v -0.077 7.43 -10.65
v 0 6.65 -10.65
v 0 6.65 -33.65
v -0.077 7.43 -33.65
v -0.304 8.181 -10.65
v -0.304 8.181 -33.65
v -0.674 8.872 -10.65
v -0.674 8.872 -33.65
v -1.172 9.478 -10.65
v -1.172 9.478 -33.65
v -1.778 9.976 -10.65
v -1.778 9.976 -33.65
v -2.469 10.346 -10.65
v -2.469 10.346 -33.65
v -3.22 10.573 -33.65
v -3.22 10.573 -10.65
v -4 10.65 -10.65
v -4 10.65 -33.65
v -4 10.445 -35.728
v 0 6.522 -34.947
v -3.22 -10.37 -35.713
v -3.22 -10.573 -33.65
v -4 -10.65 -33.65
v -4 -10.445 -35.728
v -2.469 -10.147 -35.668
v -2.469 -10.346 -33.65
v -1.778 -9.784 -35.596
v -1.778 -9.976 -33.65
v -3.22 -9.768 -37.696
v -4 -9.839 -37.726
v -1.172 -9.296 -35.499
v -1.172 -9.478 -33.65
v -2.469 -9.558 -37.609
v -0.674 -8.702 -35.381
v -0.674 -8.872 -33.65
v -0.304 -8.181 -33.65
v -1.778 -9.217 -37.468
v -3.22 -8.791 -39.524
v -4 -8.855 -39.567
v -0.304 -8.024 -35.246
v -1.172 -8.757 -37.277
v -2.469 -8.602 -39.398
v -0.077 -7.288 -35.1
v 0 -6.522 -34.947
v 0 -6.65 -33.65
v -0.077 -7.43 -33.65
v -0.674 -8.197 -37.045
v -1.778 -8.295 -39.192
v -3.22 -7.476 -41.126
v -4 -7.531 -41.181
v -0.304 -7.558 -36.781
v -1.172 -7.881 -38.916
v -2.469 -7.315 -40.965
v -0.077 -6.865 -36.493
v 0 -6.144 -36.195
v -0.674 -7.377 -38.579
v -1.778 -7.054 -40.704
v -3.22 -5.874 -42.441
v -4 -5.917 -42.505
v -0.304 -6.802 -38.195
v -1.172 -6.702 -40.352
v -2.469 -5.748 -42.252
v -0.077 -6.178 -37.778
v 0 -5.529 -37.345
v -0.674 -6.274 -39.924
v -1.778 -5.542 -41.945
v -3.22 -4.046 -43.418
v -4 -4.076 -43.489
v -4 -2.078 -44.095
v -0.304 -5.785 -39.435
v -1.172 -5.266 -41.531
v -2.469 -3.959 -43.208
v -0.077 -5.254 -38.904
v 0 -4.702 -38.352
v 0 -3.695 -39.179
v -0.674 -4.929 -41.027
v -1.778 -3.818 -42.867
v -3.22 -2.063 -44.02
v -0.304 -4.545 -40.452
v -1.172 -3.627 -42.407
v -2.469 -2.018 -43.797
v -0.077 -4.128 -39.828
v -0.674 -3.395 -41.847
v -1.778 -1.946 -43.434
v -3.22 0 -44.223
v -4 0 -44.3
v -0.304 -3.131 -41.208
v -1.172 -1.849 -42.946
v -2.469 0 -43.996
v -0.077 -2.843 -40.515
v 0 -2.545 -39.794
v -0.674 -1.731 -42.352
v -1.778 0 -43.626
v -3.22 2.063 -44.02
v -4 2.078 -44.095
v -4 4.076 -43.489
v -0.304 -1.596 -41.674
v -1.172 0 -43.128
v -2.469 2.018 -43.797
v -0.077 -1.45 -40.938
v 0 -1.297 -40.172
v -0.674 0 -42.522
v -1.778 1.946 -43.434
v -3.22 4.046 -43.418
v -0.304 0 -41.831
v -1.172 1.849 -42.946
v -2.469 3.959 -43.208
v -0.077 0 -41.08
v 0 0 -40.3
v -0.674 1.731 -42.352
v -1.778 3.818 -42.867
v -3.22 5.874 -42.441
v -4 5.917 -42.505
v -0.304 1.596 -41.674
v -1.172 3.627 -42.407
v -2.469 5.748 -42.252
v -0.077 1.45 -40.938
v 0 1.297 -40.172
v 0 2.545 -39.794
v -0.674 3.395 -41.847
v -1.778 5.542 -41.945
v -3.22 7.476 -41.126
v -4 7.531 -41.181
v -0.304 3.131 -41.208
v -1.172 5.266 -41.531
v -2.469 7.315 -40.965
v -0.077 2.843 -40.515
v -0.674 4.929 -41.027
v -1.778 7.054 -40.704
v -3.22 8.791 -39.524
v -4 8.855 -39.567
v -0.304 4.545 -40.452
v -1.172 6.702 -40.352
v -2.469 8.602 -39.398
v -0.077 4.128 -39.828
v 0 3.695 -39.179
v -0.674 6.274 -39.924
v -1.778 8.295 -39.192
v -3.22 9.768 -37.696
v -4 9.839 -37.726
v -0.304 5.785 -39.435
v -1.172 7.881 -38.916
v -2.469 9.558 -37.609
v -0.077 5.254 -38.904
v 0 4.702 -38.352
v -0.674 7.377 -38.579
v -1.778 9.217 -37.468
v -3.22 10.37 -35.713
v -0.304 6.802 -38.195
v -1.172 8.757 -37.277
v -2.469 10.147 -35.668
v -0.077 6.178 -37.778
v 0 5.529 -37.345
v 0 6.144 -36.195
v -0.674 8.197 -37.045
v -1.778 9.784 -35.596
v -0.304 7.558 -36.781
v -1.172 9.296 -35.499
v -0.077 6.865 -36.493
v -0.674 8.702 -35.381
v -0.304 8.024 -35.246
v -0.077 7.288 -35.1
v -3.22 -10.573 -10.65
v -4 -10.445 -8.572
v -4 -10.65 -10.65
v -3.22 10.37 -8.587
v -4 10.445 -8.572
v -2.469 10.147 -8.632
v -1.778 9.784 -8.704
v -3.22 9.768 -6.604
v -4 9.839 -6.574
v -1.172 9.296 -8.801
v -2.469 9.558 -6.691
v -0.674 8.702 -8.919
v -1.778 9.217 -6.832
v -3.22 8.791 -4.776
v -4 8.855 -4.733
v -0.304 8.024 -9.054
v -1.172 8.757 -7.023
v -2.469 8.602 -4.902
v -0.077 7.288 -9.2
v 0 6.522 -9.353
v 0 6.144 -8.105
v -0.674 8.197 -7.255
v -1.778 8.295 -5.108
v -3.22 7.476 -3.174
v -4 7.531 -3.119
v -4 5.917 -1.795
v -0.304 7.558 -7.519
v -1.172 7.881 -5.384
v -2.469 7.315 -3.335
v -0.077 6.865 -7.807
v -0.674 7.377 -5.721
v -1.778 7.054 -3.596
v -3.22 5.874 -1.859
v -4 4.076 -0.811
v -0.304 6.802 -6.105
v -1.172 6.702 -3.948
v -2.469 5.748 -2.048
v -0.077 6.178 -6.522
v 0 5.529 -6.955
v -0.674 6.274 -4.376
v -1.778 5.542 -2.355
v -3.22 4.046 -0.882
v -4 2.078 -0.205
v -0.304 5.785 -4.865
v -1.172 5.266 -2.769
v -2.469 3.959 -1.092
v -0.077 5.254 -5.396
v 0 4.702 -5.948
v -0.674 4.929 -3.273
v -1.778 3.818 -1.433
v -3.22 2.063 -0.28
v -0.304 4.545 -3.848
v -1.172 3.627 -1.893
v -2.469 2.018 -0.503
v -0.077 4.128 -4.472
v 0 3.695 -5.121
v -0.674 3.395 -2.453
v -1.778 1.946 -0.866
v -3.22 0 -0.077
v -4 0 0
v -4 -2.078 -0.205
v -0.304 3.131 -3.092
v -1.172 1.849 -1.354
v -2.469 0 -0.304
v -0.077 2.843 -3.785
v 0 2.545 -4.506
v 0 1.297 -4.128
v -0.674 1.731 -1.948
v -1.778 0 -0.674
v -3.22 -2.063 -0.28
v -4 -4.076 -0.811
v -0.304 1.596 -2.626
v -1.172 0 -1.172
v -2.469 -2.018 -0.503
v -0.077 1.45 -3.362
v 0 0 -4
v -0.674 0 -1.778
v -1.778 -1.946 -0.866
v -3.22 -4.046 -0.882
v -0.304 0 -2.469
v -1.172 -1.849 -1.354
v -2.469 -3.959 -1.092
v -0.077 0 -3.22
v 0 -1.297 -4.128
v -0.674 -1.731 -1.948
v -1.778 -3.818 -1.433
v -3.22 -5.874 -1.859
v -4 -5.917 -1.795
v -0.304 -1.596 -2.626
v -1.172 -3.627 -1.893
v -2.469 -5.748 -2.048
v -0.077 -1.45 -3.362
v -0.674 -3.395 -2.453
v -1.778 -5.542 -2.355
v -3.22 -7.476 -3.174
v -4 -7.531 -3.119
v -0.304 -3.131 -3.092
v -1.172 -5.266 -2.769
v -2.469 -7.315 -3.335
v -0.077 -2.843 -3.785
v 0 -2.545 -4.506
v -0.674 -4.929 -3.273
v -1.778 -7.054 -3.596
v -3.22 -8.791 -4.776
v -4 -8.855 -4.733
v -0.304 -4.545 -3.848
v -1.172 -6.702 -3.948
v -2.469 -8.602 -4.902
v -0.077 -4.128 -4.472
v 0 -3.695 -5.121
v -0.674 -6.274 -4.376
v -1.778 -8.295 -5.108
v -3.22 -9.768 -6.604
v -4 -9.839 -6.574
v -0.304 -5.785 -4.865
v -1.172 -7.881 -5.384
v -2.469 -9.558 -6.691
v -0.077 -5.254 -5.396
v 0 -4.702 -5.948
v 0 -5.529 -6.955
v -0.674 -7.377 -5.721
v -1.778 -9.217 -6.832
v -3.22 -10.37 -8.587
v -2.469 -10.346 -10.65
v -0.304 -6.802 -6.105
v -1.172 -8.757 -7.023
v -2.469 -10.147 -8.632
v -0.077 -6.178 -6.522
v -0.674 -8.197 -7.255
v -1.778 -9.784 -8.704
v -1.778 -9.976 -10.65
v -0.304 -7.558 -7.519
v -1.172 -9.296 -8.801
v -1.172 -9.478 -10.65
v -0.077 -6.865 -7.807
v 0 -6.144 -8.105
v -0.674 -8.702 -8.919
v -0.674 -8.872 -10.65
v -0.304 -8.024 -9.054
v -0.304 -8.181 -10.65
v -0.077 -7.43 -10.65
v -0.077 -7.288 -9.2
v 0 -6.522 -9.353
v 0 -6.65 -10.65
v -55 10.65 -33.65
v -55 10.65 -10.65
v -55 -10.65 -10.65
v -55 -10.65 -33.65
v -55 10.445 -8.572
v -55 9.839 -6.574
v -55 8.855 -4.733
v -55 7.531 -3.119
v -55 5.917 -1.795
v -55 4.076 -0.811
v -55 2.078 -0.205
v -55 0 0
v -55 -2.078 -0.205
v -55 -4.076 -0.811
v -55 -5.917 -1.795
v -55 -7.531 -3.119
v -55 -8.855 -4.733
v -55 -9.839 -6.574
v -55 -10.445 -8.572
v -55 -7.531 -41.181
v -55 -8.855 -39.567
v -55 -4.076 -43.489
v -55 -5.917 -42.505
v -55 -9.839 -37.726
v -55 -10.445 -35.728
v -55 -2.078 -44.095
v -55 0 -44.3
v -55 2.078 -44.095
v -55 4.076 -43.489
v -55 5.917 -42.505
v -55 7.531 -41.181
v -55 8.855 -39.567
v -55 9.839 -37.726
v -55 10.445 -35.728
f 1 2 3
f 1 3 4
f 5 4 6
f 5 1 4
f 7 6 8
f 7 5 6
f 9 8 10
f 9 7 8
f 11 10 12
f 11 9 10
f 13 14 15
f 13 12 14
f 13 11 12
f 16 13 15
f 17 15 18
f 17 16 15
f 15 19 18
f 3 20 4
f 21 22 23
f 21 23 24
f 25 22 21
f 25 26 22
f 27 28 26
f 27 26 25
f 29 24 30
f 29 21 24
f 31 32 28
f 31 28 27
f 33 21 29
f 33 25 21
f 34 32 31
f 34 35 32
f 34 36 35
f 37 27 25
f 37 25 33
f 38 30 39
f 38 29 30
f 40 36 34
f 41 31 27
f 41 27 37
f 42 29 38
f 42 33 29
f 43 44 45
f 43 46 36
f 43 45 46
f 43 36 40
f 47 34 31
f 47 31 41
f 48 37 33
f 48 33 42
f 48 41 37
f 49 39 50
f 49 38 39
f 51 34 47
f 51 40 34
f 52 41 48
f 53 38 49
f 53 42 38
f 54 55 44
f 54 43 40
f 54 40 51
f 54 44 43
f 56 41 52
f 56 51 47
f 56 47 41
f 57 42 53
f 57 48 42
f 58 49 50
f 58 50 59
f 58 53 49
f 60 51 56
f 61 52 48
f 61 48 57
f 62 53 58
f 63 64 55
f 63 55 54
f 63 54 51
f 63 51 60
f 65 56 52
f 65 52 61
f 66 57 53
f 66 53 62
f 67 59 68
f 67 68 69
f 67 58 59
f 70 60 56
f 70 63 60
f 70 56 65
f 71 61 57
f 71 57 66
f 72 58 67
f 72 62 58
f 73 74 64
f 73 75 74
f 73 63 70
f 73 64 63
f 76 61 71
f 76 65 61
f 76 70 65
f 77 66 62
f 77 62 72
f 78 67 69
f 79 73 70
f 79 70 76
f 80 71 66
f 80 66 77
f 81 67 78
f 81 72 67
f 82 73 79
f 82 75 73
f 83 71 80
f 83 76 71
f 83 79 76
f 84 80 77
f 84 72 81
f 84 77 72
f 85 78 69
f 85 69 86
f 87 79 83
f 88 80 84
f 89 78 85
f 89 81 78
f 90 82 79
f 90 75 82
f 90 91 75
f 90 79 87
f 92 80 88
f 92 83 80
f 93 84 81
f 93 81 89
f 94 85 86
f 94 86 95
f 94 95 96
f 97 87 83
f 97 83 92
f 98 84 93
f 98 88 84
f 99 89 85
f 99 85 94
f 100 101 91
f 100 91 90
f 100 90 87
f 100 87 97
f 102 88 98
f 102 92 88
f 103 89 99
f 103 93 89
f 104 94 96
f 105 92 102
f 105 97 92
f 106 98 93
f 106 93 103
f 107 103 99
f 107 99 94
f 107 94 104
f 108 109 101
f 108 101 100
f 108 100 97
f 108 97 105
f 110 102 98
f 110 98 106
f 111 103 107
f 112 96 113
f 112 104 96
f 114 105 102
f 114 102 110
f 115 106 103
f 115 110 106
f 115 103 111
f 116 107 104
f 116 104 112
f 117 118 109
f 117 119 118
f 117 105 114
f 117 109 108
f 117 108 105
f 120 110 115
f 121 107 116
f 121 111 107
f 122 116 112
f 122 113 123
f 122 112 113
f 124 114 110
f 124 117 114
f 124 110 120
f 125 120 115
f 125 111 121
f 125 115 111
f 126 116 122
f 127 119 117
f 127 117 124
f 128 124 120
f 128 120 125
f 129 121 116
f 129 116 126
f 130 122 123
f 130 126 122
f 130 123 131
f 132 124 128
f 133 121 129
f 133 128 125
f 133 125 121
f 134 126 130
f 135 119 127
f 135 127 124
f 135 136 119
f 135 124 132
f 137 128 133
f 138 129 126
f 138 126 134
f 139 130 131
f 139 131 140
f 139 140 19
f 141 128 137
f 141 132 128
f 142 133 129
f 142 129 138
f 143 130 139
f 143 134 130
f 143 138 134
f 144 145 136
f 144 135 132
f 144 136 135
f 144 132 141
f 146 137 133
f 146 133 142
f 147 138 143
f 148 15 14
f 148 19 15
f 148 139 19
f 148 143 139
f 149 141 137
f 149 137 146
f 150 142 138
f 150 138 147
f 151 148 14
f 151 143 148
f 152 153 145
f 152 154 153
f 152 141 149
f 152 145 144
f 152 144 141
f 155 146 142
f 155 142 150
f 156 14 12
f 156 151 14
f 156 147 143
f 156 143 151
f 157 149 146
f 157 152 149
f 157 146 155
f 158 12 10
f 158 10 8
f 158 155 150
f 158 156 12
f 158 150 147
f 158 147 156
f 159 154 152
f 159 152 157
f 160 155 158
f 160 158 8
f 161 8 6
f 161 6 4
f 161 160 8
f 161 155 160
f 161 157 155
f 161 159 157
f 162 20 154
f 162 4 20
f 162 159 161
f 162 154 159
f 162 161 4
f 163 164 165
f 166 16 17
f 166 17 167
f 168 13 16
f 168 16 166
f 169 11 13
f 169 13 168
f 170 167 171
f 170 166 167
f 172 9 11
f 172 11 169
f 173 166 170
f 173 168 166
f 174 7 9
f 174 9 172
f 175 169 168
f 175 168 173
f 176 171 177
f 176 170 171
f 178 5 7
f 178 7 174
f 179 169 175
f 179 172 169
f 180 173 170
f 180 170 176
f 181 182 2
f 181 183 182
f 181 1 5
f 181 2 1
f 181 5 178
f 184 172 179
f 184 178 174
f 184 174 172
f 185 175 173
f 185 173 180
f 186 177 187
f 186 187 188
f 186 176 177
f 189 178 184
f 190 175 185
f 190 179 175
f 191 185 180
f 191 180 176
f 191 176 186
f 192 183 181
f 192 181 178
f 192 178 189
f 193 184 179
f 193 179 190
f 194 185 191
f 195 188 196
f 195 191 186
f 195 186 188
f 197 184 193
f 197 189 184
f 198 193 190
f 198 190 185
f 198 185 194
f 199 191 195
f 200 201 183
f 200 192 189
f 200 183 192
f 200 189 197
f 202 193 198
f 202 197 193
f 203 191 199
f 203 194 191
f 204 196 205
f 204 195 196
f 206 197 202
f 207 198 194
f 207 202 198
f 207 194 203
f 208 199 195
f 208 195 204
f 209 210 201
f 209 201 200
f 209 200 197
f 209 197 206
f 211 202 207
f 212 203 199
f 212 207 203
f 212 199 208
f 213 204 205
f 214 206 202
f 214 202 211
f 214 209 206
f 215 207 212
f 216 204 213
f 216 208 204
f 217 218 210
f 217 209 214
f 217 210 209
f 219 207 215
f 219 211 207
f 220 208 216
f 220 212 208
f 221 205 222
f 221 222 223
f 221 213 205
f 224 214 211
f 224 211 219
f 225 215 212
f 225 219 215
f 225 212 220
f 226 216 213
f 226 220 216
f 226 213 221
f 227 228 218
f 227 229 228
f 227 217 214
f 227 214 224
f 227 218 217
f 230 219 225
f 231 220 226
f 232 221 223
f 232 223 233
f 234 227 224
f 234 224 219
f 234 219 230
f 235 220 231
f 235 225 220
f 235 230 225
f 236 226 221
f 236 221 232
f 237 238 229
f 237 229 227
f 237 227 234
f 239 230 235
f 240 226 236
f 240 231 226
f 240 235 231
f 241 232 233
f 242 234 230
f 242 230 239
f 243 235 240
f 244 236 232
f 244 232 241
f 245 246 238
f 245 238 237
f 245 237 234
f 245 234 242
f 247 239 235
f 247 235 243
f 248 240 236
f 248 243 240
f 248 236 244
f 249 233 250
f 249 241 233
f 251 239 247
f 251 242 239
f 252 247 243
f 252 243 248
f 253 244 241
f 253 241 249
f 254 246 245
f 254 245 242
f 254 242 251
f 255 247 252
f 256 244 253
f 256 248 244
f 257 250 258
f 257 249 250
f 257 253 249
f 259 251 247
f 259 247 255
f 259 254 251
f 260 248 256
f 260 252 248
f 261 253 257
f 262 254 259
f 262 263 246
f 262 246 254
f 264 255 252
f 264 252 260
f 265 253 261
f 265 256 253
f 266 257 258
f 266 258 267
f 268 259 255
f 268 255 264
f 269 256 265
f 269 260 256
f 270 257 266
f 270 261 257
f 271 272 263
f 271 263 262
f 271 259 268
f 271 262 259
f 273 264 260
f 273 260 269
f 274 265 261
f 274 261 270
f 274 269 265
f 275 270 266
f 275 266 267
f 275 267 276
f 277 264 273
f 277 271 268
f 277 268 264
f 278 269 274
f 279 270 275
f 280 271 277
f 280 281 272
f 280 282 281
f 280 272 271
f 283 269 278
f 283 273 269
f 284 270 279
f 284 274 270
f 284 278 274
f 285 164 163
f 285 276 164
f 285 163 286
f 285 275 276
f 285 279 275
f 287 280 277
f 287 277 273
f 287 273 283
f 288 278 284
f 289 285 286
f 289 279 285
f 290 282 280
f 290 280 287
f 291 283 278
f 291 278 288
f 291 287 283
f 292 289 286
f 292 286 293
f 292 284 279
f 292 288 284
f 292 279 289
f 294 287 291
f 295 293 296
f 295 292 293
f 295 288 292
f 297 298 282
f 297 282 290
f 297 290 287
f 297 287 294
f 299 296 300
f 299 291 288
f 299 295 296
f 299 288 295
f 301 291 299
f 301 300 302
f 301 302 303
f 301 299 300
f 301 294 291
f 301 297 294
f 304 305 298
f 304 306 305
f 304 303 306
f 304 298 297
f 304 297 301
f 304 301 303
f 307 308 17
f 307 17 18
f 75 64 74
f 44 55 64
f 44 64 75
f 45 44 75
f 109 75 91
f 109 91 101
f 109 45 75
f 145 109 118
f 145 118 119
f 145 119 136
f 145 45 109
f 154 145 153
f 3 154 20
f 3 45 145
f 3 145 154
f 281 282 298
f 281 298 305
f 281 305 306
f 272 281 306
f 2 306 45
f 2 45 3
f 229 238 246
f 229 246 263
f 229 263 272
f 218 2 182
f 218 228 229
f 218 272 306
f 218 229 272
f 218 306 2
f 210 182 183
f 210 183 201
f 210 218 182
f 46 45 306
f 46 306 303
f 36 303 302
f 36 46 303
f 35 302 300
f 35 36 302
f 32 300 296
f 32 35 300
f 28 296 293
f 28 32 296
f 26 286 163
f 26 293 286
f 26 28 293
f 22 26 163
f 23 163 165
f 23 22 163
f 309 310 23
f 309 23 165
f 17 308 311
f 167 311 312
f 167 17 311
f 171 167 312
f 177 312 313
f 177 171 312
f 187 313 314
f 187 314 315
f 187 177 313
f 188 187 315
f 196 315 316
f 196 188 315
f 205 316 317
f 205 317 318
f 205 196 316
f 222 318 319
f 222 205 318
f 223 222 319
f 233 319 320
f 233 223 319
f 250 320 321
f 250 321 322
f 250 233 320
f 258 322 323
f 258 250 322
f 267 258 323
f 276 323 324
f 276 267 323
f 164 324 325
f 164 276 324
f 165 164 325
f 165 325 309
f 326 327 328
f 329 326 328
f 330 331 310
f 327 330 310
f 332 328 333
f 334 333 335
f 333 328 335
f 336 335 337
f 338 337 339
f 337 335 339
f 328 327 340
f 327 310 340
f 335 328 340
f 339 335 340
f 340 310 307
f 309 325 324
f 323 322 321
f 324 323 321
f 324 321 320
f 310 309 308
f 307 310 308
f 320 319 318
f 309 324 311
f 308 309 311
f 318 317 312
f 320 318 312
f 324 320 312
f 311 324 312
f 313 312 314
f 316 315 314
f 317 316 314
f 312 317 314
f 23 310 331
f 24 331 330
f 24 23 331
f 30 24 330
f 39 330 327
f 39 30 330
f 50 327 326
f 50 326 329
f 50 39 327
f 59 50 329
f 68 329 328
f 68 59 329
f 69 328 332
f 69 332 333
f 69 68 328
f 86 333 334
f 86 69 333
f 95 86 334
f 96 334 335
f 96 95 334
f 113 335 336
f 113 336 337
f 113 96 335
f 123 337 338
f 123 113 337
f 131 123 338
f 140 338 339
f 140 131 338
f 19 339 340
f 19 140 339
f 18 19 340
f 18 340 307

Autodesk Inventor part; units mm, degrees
ref_plane "YZ Plane" through (0, 0, 0) normal (1, 0, 0) x (0, 1, 0)
ref_plane "XZ Plane" through (0, 0, 0) normal (0, 1, 0) x (-1, 0, 0)
ref_plane "XY Plane" through (0, 0, 0) normal (0, 0, 1) x (1, 0, 0)
sketch "Sketch1" plane through (0, 0, 0) normal (1, 0, 0) x (0, 1, 0)
  line L0 (0, 0) -> (0, -44.3) construction
  line L1 (10.65, -10.65) -> (10.65, -33.65)
  line L2 (-10.65, -33.65) -> (-10.65, -10.65)
  arc A0 (10.65, -10.65) -> (-10.65, -10.65) centre (0, -10.65) ccw
  arc A1 (-10.65, -33.65) -> (10.65, -33.65) centre (0, -33.65) ccw
  point P0 (0, -22.15)
  dimension "d0" = 44.3
  dimension "d1" = 21.3
extrude "Extrusion1" add sketch "Sketch1" against normal blind 55
fillet "Fillet1" radius 4 4 edges at (0, 0, 0) (0, -10.65, -22.15) (0, 0, -44.3) (0, 10.65, -22.15)
properties part number "Among Us Goggles"
